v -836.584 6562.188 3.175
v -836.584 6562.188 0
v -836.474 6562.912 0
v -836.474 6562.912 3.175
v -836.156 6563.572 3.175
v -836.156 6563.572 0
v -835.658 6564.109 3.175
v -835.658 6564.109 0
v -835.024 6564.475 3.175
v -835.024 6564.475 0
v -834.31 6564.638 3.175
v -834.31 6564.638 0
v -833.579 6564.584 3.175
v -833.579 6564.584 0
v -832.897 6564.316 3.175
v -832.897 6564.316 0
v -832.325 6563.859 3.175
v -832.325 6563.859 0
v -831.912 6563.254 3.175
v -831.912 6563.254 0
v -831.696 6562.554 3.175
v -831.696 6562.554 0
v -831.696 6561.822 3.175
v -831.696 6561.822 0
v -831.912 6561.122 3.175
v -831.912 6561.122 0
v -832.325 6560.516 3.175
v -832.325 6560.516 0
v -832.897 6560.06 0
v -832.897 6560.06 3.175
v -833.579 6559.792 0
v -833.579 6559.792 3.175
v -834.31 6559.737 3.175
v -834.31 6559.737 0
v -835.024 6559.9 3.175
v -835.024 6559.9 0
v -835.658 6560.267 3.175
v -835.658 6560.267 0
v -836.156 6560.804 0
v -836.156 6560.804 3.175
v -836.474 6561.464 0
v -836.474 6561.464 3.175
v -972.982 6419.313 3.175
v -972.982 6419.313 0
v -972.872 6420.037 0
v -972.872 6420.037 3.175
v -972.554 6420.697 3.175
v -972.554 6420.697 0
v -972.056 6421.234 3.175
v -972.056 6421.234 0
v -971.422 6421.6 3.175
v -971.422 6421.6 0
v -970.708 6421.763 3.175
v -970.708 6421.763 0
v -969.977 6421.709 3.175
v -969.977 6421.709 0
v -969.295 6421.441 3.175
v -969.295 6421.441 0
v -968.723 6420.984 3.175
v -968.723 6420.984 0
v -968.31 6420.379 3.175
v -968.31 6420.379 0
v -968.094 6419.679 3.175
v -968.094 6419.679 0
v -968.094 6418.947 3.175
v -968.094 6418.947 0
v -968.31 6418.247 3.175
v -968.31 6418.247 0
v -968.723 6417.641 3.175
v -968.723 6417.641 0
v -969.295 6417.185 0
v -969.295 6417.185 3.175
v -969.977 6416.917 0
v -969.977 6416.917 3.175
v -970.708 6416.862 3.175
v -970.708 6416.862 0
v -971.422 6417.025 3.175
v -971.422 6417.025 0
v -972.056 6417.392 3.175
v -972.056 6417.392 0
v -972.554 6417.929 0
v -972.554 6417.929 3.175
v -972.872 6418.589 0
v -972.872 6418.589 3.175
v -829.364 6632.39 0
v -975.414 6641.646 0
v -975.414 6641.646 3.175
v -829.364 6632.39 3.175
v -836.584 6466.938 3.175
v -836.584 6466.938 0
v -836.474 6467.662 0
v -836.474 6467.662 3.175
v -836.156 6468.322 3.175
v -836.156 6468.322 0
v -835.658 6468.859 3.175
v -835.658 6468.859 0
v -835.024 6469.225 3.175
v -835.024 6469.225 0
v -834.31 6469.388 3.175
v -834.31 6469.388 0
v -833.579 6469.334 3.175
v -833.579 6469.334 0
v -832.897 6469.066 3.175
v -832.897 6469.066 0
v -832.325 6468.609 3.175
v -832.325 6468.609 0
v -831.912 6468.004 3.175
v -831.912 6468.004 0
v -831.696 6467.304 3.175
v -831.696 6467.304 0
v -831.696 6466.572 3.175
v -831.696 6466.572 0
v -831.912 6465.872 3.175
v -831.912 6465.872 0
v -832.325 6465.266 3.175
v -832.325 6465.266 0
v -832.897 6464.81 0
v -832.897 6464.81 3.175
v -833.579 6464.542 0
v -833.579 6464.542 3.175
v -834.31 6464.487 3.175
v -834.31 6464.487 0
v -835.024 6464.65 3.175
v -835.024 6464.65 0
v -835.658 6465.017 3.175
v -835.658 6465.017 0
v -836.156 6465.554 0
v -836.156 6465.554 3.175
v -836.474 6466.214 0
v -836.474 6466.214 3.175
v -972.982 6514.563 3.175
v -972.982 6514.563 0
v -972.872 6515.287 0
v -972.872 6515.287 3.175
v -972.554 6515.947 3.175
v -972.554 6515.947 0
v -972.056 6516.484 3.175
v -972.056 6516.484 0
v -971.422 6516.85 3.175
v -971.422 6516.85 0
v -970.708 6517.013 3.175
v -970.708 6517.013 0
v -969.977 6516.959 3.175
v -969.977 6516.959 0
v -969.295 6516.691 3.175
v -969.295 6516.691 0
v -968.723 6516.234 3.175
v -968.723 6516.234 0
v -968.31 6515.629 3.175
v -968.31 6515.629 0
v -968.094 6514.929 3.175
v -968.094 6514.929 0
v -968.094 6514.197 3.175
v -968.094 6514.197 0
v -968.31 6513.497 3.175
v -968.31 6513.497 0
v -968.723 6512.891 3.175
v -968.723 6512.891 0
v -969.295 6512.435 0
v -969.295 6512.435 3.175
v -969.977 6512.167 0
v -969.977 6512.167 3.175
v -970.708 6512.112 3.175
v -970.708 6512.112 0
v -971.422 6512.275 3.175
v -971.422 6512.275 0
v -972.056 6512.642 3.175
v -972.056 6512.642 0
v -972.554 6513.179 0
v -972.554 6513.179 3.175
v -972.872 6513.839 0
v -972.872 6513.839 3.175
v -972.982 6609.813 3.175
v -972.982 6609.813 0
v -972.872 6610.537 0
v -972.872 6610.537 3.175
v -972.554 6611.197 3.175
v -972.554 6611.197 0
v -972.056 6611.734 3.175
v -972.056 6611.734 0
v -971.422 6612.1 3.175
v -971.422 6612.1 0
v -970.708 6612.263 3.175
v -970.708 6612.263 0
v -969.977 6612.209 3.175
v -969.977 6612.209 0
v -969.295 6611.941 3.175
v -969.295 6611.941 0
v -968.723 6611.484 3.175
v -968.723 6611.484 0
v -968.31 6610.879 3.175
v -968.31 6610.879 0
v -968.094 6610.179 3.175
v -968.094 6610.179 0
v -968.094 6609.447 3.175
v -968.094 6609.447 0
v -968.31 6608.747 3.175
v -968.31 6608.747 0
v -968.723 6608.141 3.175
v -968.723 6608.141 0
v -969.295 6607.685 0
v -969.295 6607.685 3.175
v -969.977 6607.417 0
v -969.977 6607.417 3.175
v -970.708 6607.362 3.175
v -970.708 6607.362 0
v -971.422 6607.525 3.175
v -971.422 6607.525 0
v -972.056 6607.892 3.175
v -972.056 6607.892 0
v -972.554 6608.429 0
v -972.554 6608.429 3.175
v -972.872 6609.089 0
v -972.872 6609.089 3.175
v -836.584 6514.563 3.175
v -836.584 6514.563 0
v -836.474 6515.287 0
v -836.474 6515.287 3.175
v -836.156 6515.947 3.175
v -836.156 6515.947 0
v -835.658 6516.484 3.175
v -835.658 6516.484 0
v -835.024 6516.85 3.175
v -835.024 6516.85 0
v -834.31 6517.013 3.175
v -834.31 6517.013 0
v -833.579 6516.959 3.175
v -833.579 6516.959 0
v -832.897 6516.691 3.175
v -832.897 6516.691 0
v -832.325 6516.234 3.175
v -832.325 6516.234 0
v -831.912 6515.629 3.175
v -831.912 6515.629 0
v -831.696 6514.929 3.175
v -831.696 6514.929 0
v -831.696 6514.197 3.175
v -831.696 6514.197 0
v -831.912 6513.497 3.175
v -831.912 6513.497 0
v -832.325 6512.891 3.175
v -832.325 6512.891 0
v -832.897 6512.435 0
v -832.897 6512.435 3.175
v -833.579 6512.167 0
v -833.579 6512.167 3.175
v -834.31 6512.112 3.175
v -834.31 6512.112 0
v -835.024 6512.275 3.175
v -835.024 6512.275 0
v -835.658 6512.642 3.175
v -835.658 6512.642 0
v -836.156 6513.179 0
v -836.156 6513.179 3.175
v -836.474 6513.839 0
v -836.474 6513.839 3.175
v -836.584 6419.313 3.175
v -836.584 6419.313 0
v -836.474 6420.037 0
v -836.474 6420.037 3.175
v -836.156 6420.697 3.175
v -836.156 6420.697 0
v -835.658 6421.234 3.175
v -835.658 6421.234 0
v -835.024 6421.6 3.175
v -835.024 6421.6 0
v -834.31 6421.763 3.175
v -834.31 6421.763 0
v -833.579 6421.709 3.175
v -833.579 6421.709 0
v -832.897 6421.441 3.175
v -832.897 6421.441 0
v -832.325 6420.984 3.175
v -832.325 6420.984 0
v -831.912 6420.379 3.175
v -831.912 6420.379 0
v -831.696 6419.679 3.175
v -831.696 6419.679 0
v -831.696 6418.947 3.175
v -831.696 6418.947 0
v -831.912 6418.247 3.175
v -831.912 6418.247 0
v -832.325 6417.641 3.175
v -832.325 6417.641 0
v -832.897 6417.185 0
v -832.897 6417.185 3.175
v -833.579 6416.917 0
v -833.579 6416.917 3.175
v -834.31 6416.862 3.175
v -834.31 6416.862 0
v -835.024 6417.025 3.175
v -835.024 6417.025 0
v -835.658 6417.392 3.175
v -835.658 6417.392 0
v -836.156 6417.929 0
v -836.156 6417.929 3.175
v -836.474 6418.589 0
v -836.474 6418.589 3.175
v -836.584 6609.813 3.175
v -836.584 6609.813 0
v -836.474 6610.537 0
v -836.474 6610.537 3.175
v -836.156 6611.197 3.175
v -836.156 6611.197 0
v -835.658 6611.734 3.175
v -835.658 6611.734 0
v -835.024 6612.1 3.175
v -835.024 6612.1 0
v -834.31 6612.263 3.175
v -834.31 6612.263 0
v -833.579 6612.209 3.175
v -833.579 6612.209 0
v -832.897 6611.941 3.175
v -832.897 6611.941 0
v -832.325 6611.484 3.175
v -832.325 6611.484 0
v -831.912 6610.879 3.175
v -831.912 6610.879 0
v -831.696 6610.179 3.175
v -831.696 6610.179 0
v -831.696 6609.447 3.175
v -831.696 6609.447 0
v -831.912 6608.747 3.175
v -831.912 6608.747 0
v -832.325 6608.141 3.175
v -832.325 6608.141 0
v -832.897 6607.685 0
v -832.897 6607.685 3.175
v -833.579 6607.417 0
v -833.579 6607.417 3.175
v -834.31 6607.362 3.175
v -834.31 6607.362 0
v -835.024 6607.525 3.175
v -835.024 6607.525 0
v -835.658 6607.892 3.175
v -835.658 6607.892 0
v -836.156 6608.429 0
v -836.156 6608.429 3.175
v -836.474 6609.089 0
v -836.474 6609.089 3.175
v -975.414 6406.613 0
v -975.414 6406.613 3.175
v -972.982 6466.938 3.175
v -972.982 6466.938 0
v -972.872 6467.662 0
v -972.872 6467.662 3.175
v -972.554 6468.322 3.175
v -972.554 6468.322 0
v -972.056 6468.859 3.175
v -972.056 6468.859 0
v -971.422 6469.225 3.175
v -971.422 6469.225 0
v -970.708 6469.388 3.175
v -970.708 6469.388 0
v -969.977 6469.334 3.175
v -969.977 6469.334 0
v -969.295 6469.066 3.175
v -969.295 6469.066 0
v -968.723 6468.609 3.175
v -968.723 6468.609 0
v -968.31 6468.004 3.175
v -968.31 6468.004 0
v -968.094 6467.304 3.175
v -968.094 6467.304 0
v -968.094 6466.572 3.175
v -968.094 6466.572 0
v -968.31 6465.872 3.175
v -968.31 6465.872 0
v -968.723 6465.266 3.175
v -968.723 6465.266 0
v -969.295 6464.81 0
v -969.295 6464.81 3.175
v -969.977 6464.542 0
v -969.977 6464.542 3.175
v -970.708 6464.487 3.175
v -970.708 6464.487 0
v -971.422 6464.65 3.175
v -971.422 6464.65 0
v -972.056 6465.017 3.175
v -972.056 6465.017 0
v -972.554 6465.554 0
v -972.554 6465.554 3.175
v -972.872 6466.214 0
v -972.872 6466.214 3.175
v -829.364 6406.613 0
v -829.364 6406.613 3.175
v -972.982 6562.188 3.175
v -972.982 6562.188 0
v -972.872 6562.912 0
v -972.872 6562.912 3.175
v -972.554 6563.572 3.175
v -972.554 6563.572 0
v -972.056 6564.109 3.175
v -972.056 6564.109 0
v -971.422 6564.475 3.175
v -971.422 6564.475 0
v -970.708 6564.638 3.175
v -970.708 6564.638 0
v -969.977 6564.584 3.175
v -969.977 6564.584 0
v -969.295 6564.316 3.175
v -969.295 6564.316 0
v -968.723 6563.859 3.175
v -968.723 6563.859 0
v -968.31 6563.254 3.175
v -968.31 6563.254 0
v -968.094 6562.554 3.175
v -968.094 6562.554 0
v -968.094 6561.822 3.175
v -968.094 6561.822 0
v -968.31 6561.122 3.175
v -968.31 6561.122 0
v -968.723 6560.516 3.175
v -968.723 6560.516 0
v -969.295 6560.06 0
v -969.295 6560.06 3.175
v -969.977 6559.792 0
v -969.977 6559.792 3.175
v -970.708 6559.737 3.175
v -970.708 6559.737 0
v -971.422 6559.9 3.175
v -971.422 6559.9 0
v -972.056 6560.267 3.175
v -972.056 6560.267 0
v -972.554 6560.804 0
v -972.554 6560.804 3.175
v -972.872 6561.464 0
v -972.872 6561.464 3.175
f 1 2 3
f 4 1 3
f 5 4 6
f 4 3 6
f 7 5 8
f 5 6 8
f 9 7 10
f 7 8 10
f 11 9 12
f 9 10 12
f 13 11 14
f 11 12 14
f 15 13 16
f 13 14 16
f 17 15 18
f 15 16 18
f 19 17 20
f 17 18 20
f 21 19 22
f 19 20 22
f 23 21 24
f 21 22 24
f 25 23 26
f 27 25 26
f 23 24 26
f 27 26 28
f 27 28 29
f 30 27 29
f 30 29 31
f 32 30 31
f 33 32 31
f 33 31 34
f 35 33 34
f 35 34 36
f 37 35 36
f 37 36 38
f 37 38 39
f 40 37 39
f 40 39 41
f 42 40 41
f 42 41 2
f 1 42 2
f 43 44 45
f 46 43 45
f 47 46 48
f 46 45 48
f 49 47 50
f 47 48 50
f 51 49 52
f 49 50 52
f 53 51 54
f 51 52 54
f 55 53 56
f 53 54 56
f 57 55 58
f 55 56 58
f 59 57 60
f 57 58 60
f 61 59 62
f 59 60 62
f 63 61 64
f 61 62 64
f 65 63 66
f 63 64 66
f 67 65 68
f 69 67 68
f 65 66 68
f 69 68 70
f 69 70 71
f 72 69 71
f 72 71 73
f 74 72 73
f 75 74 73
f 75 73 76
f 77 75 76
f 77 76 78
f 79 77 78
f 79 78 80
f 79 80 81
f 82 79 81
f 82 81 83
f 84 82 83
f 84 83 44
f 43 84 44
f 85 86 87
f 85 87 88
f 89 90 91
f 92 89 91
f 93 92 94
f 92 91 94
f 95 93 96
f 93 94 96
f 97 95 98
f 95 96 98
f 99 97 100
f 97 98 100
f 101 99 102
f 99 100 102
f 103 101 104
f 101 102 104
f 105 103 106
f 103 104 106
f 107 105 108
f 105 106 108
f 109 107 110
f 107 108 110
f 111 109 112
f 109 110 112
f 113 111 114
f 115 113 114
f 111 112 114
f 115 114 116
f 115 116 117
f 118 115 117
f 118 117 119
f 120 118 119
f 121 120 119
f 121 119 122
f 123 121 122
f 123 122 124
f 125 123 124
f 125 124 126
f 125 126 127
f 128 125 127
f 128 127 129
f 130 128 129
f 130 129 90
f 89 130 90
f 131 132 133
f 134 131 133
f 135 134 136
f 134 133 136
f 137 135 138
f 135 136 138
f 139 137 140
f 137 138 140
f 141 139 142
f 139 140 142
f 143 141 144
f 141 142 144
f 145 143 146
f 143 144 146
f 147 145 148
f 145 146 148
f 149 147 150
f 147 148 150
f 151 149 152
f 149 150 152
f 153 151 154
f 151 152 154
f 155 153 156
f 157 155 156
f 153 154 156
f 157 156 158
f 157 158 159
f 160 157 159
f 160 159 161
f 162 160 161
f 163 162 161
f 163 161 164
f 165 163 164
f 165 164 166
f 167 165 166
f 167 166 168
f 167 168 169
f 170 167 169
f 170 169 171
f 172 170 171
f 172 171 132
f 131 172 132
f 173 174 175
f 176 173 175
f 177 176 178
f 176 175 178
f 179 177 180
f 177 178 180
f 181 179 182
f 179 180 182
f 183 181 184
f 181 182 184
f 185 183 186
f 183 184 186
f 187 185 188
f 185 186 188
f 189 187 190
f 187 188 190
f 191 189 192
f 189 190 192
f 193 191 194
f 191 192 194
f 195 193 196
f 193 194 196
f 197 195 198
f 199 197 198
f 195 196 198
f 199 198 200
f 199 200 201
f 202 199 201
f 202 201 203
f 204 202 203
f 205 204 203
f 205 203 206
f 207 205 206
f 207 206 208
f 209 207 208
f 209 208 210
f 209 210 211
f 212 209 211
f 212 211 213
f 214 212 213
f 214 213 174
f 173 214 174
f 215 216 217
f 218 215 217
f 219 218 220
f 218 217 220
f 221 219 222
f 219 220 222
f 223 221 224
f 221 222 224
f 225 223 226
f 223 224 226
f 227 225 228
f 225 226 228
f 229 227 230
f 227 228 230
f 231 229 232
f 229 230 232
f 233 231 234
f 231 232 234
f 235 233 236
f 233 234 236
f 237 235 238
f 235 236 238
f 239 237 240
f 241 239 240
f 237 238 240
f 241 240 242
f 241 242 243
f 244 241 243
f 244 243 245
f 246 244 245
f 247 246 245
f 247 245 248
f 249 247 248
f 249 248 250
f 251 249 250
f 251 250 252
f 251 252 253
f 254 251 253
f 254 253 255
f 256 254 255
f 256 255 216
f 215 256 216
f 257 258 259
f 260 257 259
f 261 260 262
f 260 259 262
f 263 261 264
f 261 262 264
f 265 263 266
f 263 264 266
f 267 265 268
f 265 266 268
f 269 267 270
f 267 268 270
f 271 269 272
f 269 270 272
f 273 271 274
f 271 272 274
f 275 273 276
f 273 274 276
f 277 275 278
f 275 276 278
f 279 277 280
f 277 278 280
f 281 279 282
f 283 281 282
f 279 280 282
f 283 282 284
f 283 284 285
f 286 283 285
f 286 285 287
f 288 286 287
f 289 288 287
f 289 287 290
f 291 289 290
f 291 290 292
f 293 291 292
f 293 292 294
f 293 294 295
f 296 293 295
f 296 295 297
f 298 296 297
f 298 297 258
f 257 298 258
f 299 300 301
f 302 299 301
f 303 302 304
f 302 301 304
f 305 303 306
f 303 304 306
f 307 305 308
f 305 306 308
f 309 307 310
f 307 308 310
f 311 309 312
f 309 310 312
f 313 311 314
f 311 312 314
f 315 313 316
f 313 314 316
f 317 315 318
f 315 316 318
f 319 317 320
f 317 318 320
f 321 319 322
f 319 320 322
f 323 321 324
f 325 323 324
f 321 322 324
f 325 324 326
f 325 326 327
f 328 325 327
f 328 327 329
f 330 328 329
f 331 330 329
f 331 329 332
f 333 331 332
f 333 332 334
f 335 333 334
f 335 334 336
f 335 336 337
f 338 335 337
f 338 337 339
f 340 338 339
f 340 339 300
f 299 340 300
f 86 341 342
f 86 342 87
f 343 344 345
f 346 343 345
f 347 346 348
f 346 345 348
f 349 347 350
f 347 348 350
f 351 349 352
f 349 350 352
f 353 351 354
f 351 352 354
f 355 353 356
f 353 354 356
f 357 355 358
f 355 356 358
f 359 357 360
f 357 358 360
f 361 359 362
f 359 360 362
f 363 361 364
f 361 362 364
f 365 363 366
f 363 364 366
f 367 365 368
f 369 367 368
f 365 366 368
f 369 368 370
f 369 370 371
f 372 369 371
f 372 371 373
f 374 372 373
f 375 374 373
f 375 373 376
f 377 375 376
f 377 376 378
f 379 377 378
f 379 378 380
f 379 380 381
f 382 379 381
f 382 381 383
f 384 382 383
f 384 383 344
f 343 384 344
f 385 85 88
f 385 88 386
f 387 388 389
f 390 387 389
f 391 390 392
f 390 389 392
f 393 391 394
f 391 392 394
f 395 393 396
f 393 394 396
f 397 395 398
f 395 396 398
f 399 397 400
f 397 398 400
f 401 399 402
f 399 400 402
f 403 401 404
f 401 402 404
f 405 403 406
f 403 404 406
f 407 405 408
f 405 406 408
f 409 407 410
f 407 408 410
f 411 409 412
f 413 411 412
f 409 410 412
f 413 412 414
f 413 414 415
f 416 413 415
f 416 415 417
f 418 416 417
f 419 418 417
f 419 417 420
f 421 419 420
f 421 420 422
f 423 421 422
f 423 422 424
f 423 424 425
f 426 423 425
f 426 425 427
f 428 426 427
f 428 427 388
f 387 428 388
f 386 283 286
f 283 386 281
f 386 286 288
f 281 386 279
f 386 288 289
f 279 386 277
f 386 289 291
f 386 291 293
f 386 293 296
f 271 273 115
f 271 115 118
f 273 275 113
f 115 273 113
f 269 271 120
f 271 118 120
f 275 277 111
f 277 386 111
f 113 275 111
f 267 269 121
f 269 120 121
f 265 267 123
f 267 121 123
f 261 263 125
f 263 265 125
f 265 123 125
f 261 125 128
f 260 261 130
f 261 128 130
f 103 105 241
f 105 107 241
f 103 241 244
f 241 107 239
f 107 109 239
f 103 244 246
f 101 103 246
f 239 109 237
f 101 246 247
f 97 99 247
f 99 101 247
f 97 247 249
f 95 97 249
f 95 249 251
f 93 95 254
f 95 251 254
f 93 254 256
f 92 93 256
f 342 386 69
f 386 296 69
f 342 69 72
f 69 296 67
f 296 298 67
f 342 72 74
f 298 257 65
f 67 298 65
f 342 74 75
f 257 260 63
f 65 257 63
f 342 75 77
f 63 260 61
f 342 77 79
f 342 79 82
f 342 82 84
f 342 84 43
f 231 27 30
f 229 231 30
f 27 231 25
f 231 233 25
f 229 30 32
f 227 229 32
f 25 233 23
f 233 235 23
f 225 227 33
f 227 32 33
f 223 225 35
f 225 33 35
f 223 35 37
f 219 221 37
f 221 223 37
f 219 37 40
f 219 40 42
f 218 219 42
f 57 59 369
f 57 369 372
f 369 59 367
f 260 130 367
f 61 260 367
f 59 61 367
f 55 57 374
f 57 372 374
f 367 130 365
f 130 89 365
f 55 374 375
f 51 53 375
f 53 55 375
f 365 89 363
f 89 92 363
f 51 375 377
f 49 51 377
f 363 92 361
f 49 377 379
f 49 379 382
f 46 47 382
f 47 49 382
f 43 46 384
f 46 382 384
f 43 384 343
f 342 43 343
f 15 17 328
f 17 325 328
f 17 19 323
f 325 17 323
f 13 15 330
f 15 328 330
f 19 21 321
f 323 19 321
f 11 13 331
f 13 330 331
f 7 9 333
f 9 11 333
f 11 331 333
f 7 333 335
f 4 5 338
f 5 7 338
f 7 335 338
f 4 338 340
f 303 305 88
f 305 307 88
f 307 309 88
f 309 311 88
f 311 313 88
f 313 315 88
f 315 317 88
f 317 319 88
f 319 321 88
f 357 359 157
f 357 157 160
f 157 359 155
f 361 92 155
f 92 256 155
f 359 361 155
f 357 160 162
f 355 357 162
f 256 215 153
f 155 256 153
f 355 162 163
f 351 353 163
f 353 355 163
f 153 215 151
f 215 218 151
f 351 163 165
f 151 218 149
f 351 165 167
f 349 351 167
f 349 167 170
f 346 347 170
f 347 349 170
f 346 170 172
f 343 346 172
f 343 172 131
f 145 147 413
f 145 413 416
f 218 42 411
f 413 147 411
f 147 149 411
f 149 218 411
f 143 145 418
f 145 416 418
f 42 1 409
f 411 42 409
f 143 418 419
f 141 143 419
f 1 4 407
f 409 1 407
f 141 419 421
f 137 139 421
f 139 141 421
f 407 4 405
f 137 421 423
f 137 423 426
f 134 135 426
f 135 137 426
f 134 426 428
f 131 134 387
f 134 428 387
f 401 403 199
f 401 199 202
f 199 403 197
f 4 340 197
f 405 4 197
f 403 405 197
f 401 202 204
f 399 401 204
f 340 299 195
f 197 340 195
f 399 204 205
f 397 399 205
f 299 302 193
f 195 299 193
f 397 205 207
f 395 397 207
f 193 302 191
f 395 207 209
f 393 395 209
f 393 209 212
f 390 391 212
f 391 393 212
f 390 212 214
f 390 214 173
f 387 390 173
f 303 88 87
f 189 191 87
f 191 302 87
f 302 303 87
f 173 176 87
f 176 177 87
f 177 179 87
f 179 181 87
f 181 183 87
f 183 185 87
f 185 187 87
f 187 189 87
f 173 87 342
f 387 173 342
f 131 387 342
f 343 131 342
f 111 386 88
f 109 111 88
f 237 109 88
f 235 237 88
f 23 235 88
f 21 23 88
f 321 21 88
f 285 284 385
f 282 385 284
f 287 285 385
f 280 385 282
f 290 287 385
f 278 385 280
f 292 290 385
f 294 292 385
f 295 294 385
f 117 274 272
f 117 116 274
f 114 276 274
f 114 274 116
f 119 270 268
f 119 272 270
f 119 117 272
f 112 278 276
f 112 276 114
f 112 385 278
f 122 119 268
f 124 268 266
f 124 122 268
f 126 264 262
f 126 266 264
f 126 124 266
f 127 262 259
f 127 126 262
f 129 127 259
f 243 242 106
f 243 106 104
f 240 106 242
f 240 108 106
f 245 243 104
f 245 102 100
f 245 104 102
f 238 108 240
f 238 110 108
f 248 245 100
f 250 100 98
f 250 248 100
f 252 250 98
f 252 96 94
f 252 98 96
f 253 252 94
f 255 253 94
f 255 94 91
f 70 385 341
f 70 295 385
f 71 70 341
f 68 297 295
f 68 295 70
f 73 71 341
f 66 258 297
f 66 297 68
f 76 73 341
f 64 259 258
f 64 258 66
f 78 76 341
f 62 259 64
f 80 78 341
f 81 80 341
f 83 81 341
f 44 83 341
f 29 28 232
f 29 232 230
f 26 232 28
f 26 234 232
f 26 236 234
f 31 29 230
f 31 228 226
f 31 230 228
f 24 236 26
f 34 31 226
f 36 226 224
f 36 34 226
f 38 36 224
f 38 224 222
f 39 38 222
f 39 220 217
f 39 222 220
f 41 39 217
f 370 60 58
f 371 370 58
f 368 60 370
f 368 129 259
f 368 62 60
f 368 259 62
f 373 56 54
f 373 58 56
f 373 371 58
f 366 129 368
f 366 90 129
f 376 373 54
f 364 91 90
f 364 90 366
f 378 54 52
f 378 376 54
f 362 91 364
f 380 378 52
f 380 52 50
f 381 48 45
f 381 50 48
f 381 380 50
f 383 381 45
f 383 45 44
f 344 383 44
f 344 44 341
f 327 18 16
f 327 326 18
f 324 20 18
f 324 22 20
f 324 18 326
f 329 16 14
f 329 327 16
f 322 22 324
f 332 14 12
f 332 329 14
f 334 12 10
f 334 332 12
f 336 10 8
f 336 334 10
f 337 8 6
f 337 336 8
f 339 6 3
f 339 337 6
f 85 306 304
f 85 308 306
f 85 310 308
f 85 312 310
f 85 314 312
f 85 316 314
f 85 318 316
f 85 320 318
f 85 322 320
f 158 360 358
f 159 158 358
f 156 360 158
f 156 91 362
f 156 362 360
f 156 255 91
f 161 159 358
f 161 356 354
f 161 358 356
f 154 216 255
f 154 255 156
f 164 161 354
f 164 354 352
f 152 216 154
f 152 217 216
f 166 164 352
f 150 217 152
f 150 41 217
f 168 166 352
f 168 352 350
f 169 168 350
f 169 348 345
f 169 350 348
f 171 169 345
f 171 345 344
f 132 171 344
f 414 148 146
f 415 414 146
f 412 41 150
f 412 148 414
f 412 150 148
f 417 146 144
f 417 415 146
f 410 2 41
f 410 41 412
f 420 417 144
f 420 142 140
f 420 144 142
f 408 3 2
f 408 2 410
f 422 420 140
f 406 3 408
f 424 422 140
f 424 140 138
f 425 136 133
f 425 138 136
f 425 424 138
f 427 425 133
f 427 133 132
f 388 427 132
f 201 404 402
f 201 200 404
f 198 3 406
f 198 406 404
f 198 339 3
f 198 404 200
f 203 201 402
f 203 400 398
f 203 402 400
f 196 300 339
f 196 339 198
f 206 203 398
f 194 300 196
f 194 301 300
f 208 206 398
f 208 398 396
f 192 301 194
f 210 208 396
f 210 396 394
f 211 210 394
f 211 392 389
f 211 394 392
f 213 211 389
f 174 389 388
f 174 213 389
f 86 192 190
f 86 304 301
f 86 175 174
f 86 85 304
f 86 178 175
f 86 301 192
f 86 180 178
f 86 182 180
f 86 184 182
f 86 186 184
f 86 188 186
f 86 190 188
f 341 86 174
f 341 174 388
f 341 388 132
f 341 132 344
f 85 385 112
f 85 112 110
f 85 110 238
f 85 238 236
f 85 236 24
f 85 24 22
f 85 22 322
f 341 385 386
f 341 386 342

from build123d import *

# Parameters (mm, degrees)
BOSS_EXTRUDE1_DEPTH       = 3.175
F_8_CLEARANCE_HOLE1_D     = 4.9149
F_8_CLEARANCE_HOLE1_DEPTH = 3.175


with BuildPart() as part:
    # Sketch1 → Boss-Extrude1 (new body)
    with BuildSketch(Plane.XY):
        Polygon((-829.363556946, 6406.612895041), (-975.413556946, 6406.612895041), (-975.413556946, 6641.646276193), (-829.363556946, 6632.389598842), align=None)
    extrude(amount=BOSS_EXTRUDE1_DEPTH)

    # #8 Clearance Hole1
    with Locations(Plane.XY.offset(3.175)):
        with Locations((-970.524056946, 6609.812895041), (-970.524056946, 6562.187895041), (-970.524056946, 6514.562895041), (-970.524056946, 6466.937895041), (-970.524056946, 6419.312895041), (-834.126056946, 6419.312895041), (-834.126056946, 6466.937895041), (-834.126056946, 6514.562895041), (-834.126056946, 6562.187895041), (-834.126056946, 6609.812895041)):
            Hole(F_8_CLEARANCE_HOLE1_D / 2, depth=F_8_CLEARANCE_HOLE1_DEPTH)


solid = part.part
